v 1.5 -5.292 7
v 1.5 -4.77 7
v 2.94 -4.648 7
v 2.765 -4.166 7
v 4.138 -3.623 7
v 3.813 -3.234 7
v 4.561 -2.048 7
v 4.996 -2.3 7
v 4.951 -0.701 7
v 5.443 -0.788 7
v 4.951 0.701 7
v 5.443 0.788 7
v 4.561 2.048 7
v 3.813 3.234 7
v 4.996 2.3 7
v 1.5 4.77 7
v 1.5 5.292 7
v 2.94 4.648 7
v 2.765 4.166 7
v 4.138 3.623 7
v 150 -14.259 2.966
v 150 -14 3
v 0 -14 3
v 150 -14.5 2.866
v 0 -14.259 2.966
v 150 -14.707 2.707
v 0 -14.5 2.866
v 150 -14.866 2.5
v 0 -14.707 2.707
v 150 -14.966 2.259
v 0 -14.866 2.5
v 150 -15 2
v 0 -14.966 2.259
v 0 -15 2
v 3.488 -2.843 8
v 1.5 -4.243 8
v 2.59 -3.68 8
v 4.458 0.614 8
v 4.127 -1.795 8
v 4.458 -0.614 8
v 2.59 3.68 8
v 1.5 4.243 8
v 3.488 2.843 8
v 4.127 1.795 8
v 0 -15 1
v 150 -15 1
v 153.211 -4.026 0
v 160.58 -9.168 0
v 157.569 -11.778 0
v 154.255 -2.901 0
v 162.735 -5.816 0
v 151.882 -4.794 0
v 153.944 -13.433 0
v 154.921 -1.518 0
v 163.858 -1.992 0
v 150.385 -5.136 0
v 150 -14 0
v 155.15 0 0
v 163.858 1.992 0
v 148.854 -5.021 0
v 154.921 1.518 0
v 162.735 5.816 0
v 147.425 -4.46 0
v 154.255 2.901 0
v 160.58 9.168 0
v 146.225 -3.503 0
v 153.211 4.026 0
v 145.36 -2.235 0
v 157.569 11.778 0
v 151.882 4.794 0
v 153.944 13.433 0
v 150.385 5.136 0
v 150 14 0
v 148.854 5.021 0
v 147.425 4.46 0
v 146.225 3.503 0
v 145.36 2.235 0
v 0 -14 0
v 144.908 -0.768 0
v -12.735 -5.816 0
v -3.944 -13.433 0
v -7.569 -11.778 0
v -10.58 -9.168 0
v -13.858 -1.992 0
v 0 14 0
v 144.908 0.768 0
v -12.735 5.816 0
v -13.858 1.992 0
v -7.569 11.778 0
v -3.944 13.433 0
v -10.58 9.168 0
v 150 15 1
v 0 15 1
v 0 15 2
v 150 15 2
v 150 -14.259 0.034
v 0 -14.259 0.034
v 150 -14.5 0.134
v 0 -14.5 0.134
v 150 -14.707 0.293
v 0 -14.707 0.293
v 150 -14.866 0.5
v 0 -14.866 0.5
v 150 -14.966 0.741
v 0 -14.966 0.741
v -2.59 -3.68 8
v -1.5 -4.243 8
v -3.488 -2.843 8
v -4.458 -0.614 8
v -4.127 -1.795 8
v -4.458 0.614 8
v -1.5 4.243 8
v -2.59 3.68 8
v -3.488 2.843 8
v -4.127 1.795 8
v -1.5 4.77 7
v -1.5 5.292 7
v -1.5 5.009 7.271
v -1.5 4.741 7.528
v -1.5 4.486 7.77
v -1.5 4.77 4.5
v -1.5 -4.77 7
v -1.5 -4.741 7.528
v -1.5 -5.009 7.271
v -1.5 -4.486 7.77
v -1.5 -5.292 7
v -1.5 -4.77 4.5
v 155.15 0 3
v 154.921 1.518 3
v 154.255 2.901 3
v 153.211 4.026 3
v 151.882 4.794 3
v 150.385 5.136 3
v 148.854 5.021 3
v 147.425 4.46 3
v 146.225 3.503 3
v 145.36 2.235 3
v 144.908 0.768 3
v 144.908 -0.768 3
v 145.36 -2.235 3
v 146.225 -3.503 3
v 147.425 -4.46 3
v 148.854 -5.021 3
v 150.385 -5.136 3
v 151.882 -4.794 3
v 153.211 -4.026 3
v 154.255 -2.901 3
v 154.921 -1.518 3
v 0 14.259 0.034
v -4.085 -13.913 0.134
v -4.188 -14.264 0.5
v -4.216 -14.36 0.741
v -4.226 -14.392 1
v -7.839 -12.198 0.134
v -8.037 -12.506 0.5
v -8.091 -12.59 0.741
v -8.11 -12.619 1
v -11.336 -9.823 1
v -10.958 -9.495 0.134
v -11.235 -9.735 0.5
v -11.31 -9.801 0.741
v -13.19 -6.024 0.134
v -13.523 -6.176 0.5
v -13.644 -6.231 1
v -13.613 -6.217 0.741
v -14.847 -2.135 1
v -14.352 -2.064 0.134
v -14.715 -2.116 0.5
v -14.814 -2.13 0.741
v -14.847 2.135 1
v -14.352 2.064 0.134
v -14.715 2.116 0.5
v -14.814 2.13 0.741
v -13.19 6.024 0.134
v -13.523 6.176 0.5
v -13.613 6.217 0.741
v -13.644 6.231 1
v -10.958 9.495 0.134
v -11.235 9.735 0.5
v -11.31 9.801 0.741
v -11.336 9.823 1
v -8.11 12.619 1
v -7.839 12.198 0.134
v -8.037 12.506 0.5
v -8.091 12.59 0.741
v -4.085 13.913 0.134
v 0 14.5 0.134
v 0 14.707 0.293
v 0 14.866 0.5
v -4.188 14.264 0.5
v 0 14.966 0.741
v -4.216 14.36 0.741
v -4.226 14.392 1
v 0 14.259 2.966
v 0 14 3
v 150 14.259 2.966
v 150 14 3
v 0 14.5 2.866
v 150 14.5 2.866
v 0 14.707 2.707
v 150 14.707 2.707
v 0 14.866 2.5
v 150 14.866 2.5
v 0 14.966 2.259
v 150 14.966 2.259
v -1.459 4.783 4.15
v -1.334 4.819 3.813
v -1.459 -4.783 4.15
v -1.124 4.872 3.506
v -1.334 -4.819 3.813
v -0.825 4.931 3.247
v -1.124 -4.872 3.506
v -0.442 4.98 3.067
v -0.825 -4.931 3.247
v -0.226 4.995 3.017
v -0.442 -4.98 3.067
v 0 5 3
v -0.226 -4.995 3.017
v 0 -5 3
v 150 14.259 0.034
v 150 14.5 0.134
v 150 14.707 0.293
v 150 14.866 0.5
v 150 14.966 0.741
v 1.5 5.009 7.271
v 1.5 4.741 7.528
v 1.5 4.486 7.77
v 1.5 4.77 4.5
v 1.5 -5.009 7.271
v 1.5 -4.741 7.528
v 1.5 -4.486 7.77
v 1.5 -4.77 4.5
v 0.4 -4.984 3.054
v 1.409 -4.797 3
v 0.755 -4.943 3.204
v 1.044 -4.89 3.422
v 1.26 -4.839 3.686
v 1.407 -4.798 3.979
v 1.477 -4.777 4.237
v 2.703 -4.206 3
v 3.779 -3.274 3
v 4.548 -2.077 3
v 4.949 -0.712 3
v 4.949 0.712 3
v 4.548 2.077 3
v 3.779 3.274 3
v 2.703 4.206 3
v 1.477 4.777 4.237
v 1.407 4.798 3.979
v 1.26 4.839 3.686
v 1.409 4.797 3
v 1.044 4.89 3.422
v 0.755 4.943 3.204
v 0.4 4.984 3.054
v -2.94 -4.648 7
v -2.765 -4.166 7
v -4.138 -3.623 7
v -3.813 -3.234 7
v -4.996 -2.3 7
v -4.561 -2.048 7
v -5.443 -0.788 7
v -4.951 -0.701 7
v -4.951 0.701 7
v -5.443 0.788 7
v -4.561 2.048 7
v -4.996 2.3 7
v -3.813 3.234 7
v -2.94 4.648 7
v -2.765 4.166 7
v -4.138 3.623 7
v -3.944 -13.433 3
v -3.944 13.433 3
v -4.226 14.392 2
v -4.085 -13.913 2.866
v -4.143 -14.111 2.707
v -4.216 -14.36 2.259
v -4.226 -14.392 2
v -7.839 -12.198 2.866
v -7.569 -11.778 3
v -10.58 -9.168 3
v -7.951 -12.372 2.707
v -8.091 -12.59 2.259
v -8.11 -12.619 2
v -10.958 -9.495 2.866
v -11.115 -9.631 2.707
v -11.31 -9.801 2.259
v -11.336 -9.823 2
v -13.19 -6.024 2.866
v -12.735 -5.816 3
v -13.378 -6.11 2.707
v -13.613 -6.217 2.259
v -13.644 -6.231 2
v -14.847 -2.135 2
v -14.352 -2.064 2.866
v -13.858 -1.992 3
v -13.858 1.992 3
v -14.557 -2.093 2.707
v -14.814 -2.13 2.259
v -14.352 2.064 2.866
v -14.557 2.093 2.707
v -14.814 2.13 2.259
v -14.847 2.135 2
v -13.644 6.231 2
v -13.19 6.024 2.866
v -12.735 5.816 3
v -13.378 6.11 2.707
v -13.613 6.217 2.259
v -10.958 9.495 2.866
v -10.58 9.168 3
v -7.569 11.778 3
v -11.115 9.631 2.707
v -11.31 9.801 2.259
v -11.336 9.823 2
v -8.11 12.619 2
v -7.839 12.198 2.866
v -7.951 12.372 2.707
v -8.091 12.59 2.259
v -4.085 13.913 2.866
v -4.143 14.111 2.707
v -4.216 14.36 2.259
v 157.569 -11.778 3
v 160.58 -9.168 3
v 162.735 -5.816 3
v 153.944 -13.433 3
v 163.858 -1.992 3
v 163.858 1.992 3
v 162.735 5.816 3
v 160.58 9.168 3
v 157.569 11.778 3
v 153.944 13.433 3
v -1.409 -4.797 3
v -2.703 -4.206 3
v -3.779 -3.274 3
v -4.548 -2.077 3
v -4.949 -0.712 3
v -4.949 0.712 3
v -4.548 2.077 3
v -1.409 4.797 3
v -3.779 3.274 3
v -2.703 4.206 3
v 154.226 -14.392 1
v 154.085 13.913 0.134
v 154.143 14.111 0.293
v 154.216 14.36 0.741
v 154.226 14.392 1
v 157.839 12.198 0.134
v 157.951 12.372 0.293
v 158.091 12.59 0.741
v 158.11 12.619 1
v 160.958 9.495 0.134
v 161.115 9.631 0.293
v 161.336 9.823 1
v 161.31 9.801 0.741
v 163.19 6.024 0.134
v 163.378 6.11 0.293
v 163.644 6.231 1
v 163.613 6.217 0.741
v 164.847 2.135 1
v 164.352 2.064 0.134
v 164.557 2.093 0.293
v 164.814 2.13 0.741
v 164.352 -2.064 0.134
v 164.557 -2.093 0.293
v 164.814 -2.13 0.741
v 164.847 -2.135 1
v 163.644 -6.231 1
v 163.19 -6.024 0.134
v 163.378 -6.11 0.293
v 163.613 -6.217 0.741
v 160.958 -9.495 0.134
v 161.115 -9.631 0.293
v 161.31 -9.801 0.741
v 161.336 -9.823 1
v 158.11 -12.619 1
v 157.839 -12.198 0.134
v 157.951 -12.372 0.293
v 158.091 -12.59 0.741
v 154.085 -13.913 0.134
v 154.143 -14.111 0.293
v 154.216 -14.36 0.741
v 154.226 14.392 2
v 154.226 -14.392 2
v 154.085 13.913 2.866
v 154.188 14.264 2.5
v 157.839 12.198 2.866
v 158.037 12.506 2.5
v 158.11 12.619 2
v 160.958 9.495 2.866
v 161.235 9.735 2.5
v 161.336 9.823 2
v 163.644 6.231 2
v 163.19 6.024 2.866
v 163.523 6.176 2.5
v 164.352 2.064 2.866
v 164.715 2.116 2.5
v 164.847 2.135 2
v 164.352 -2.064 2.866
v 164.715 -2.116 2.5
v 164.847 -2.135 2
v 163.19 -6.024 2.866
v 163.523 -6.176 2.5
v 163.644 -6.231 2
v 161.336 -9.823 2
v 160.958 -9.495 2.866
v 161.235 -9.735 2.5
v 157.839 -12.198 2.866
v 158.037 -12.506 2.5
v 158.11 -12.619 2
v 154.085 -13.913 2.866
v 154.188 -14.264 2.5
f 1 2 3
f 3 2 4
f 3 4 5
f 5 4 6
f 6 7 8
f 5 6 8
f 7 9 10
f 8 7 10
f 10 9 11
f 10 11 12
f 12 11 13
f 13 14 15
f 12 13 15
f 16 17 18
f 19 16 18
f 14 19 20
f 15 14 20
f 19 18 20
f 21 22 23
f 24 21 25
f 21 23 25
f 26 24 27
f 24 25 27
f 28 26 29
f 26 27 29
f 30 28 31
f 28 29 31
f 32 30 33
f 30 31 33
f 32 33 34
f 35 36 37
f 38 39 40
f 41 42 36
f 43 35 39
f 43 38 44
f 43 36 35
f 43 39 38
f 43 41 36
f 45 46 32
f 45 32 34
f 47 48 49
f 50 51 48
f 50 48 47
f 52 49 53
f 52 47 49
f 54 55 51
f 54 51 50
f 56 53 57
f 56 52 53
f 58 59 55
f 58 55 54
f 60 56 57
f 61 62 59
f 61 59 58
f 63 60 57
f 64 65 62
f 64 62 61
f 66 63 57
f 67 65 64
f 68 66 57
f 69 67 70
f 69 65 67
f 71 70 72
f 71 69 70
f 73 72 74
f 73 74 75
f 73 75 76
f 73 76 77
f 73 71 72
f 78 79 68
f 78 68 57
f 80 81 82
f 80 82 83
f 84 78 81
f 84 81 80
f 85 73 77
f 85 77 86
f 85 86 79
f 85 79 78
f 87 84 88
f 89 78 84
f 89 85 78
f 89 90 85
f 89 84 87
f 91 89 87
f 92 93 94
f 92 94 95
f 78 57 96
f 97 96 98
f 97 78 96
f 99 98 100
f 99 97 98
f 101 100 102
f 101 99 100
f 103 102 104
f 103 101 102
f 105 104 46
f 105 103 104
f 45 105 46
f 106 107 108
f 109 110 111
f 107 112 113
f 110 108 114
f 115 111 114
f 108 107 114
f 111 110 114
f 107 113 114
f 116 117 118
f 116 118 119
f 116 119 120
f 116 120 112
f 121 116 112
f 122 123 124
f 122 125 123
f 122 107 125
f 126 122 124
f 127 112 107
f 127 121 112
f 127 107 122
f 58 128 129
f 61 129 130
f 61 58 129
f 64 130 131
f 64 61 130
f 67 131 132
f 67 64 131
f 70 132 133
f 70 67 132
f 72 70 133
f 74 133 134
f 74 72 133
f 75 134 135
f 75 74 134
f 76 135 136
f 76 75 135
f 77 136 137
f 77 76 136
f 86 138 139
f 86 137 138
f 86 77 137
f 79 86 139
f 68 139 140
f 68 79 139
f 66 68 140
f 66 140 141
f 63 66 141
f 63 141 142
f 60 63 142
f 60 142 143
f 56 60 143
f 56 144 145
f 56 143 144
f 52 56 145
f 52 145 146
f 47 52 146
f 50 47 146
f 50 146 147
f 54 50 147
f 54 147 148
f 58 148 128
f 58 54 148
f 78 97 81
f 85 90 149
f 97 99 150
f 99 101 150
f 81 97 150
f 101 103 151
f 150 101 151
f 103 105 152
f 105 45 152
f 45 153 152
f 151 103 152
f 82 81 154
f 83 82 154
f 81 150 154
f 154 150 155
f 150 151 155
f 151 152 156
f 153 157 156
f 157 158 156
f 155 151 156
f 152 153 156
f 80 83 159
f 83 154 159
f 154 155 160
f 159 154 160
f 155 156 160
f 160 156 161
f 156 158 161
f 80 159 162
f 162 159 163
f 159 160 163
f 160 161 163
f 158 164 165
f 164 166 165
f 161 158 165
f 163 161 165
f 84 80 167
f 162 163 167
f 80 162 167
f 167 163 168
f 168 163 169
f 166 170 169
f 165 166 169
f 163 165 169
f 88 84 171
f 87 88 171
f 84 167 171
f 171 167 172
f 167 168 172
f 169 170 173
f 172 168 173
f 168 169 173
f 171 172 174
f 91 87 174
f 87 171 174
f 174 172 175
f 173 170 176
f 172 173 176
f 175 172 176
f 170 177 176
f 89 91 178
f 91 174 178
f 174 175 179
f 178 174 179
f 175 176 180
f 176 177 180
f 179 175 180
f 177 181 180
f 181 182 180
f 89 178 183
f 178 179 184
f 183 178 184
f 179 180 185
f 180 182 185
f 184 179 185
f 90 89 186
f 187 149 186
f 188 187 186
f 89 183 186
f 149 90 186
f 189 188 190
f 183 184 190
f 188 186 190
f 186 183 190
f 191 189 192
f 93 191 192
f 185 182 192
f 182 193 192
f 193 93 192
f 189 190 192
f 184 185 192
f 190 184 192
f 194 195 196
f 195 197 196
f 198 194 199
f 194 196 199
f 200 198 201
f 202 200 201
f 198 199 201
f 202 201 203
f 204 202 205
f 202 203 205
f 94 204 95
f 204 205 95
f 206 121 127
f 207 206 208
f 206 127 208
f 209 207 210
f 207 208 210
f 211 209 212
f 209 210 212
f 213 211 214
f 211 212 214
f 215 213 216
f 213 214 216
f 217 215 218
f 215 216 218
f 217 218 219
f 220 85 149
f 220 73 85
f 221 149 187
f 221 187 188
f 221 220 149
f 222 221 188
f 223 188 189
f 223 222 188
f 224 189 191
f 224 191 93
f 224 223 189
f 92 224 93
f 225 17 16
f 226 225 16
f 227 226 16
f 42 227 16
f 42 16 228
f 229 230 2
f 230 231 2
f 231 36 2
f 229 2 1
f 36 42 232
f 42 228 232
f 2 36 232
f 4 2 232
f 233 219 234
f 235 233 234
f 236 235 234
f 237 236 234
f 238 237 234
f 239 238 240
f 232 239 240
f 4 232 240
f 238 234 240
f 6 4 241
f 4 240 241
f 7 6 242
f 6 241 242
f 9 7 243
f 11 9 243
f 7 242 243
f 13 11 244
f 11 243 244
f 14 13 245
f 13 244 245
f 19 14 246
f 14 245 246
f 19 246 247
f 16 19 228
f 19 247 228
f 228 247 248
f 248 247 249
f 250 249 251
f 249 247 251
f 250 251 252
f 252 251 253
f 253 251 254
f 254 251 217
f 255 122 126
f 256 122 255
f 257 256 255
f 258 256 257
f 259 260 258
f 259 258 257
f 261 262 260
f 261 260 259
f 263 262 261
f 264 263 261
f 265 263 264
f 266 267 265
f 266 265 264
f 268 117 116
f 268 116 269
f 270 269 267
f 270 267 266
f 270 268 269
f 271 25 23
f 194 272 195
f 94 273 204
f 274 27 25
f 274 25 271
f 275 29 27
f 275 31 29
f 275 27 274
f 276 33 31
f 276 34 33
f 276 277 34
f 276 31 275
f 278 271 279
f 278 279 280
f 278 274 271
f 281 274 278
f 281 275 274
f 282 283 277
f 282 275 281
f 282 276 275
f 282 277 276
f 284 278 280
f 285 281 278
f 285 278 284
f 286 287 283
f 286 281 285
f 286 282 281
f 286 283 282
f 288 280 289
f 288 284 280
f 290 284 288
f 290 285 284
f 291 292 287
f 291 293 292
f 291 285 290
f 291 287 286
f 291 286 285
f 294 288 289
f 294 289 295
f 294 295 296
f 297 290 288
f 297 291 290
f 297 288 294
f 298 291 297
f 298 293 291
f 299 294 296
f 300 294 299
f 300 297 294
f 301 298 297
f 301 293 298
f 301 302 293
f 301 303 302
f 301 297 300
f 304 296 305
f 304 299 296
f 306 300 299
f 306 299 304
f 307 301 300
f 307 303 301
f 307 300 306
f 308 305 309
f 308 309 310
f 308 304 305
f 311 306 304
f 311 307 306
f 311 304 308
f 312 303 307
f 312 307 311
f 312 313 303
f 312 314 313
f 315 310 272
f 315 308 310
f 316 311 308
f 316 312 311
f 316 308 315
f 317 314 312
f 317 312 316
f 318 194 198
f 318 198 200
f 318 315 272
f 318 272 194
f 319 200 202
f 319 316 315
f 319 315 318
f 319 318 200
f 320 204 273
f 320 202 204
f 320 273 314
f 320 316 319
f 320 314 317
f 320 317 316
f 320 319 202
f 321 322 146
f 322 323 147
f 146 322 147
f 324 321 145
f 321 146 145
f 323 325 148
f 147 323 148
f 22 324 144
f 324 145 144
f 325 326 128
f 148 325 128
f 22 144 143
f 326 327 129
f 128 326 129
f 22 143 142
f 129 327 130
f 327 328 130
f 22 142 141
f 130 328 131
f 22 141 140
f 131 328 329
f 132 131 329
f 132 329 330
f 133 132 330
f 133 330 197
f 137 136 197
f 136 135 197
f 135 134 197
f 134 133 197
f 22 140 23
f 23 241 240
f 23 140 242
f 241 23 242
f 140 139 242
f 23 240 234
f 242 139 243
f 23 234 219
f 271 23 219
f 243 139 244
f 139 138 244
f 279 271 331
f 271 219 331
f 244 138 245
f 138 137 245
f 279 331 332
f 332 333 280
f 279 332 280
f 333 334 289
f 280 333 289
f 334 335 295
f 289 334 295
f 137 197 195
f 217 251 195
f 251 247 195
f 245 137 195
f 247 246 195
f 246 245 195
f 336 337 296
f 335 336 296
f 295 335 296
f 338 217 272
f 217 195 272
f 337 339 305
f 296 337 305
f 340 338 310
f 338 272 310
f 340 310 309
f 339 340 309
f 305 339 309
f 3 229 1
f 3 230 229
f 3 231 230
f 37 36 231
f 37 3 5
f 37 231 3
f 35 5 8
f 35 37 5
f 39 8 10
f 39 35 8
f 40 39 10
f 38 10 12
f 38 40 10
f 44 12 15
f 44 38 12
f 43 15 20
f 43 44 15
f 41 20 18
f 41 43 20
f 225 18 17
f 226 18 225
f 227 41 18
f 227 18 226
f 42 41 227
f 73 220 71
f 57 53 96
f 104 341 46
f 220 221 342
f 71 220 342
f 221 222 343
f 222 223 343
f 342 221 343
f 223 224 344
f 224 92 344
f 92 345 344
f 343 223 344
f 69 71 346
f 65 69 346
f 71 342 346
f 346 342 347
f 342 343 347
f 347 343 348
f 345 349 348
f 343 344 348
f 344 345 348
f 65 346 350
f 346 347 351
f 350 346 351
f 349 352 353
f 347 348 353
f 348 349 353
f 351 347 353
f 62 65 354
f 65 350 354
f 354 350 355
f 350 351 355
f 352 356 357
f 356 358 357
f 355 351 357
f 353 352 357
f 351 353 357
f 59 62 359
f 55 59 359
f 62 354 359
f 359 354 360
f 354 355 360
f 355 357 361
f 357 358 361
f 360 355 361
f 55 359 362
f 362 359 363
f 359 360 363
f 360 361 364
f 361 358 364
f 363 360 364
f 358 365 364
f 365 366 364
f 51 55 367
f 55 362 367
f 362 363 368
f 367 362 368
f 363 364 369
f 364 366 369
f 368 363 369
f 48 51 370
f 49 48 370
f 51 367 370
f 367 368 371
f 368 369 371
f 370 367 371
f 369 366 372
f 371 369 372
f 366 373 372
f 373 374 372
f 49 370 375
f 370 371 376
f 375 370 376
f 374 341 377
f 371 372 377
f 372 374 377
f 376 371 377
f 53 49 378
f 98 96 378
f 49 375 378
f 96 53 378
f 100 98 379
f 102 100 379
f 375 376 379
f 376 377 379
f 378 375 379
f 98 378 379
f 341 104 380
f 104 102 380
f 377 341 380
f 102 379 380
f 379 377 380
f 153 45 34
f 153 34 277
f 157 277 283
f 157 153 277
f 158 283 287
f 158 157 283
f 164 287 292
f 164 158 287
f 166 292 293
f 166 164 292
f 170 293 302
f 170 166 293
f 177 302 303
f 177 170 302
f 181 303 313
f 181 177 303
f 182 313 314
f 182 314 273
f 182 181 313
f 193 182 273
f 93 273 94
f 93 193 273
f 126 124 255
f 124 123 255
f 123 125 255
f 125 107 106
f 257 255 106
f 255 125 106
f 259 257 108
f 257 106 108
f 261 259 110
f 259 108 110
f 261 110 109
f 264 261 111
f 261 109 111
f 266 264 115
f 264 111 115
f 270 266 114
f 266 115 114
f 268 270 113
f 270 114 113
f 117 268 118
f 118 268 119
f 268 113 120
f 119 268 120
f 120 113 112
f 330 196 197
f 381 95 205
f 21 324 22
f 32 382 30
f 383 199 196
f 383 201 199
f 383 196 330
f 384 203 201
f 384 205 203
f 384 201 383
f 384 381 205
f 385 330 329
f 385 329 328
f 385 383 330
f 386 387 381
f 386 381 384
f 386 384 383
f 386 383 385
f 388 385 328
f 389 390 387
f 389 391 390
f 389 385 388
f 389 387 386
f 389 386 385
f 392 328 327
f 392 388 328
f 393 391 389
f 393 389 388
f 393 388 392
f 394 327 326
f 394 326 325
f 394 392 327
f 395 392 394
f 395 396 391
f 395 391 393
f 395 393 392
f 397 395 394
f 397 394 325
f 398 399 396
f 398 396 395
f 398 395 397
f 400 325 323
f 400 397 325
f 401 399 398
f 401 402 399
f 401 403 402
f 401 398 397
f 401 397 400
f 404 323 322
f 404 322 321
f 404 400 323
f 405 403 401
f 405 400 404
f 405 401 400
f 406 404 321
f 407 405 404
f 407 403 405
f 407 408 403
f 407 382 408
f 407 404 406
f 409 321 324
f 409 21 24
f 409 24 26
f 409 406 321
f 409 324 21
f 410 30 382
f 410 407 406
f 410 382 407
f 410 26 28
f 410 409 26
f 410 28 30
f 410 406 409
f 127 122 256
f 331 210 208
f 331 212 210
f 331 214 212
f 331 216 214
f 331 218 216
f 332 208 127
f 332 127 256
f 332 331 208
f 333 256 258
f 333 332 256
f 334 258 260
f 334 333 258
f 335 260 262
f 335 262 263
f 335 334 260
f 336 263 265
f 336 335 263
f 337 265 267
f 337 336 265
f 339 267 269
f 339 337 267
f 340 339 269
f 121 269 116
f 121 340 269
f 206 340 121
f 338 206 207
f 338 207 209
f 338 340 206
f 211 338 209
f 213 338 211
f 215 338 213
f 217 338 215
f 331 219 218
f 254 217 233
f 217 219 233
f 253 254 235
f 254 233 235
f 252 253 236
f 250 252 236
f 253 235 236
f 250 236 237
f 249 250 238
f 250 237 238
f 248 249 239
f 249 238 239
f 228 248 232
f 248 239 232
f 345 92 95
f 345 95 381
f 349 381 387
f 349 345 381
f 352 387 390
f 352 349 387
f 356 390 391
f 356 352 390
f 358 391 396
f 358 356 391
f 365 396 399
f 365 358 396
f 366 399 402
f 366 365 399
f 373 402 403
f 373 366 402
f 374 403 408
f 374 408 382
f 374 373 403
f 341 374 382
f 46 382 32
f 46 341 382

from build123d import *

# Parameters (mm, degrees)
EXTRUDE_1_DEPTH     = 3
EXTRUDE_2_DEPTH     = 4
EXTRUDE_3_DEPTH     = 1
CHAMFER_1_SIZE      = 1
SKETCH_1_3_R        = 5.15
CUT_EXTRUDE_1_DEPTH = 5
FILLET_1_R          = 1.5
FILLET_2_R          = 1


with BuildPart() as part:
    # 草图1 → 凸台-拉伸1 (new body)
    with BuildSketch(Plane.XY):
        with BuildLine():
            Line((0, 15), (150, 15))
            ThreePointArc((150, 15), (165, 0), (150, -15))
            Line((150, -15), (0, -15))
            ThreePointArc((0, -15), (-15, 0), (0, 15))
        make_face()
    extrude(amount=EXTRUDE_1_DEPTH)

    # 草图2 → 凸台-拉伸2 (add)
    with BuildSketch(Plane.XY.offset(3)):
        with BuildLine():
            Line((-1.5, 4.769696007), (-1.5, -4.769696007))
            ThreePointArc((-1.5, -4.769696007), (-5, 0), (-1.5, 4.769696007))
        make_face()
        with BuildLine():
            Line((1.5, 4.769696007), (1.5, -4.769696007))
            ThreePointArc((1.5, -4.769696007), (5, 0), (1.5, 4.769696007))
        make_face()
    extrude(amount=EXTRUDE_2_DEPTH)

    # 草图5 → 凸台-拉伸3 (add)
    with BuildSketch(Plane.XY.offset(7)):
        with BuildLine():
            Line((-1.5, 5.291502622), (-1.5, -5.291502622))
            ThreePointArc((-1.5, -5.291502622), (-5.5, 0), (-1.5, 5.291502622))
        make_face()
        with BuildLine():
            Line((1.5, 5.291502622), (1.5, -5.291502622))
            ThreePointArc((1.5, -5.291502622), (5.5, 0), (1.5, 5.291502622))
        make_face()
    extrude(amount=EXTRUDE_3_DEPTH)

    # 倒角1
    chamfer_1_edges = [part.edges().sort_by_distance(p)[0] for p in [
        (5.5, 0, 8),
        (-5.5, 0, 8),
    ]]
    chamfer(chamfer_1_edges, length=CHAMFER_1_SIZE - 0.0001)  # a hair under: the kernel refuses the full size

    # 草图1<3> → 切除-拉伸1 (cut)
    with BuildSketch(Plane.XY):
        with Locations((150, 0)):
            Circle(SKETCH_1_3_R)
    extrude(amount=CUT_EXTRUDE_1_DEPTH, mode=Mode.SUBTRACT)

    # 圆角1
    fillet_1_edges = [part.edges().sort_by_distance(p)[0] for p in [
        (-1.5, 0, 3),
        (1.5, 0, 3),
    ]]
    fillet(fillet_1_edges, radius=FILLET_1_R - 0.0001)  # a hair under: the kernel refuses the full size

    # 圆角2
    fillet_2_edges = [part.edges().sort_by_distance(p)[0] for p in [
        (165, 0, 3),
        (75, 15, 3),
        (-15, 0, 3),
        (75, 15, 0),
        (165, 0, 0),
        (75, -15, 0),
        (-15, 0, 0),
        (75, -15, 3),
    ]]
    fillet(fillet_2_edges, radius=FILLET_2_R)


solid = part.part
